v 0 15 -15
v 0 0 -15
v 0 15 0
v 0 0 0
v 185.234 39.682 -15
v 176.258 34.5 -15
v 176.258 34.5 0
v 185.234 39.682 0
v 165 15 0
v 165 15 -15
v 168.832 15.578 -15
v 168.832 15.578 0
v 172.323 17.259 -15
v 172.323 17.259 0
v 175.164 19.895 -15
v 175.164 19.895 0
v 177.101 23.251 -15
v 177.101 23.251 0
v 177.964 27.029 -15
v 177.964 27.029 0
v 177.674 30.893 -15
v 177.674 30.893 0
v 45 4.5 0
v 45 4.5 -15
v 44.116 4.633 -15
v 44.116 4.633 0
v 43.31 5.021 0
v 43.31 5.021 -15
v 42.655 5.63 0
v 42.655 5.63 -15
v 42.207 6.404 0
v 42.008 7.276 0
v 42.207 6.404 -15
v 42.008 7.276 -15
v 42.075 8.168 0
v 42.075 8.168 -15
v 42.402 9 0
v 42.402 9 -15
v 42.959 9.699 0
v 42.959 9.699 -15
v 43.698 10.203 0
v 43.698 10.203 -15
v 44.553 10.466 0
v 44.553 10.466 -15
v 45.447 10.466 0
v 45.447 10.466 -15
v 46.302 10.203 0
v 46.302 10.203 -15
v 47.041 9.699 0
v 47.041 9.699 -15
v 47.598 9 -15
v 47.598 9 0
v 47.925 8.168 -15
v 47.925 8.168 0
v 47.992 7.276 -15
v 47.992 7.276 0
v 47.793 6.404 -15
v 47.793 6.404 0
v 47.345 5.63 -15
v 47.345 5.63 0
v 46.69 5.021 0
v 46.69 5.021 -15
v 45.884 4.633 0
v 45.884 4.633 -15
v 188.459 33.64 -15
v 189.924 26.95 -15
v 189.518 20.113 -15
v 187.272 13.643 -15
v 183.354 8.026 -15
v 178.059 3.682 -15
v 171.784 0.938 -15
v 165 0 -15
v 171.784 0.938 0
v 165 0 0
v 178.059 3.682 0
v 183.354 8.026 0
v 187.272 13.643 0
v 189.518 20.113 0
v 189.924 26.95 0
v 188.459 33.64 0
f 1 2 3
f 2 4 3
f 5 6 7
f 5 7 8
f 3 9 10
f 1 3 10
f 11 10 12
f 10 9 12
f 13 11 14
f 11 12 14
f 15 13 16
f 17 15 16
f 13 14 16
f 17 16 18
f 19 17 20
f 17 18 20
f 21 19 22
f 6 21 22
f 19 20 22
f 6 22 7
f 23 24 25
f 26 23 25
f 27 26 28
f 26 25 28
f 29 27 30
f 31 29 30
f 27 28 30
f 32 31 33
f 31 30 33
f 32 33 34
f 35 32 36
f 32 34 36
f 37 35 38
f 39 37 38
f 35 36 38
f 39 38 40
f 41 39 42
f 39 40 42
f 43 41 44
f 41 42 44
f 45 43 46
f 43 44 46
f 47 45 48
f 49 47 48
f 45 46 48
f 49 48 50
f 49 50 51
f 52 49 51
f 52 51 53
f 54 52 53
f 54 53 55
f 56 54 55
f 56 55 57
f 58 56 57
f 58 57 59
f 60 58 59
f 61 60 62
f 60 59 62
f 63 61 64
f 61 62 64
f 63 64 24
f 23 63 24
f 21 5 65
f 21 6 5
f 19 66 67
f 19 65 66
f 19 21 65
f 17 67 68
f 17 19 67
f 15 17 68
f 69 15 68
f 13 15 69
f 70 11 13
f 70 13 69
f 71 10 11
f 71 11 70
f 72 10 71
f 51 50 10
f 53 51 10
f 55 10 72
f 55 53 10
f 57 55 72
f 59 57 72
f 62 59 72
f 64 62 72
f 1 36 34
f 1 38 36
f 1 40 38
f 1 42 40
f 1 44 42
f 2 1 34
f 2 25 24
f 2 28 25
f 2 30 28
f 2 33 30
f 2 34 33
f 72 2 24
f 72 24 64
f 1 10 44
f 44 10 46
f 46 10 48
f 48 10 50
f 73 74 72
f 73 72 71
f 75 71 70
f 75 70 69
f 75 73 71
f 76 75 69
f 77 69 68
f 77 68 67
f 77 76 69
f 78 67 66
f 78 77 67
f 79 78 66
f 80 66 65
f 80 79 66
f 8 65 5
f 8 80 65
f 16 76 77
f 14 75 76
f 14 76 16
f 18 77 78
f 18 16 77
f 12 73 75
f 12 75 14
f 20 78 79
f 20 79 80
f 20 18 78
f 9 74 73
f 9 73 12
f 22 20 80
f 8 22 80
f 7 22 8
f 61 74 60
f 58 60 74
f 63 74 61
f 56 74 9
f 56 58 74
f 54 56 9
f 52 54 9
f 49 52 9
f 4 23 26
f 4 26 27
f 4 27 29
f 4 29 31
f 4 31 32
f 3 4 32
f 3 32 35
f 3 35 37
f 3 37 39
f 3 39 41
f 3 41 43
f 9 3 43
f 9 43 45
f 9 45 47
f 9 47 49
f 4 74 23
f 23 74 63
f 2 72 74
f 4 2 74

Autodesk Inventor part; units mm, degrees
ref_plane "YZ Plane" through (0, 0, 0) normal (1, 0, 0) x (0, 1, 0)
ref_plane "XZ Plane" through (0, 0, 0) normal (0, 1, 0) x (-1, 0, 0)
ref_plane "XY Plane" through (0, 0, 0) normal (0, 0, 1) x (1, 0, 0)
sketch "Sketch1" plane through (0, 0, 0) normal (1, 0, 0) x (0, 1, 0)
  line L0 (0, 0) -> (15, 0)
  line L1 (15, 0) -> (15, -15)
  line L2 (15, -15) -> (0, -15)
  line L3 (0, -15) -> (0, 0)
  dimension "d1" = 15
  dimension "d2" = 15
extrude "Extrusion1" add sketch "Sketch1" along normal blind 165
sketch "Sketch2" plane through (0, 0, 0) normal (0, 0, 1) x (1, 0, 0)
  line L0 (104.748, 28) -> (222.799, 28) construction
  line L1 (0, 15) -> (165, 15) projected
  line L2 (165, 15) -> (165, 0) projected
  line L3 (165, 15) -> (165, 53.4623) construction
  line L4 (116.7358, 25) -> (195.5126, 25) construction
  line L5 (0, 0) -> (165, 0) projected
  line L6 (176.2583, 34.5) -> (185.2344, 39.6823)
  arc A0 (165, 0) -> (185.2344, 39.6823) centre (165, 25) ccw
  arc A1 (165, 15) -> (176.2583, 34.5) centre (165, 28) ccw
  dimension "d5" = 13
  dimension "d6" = 25
  dimension "d9" = 11.2583
  dimension "d10" = 20.2344
extrude "Extrusion2" add sketch "Sketch2" against normal blind 15
sketch "Sketch3" plane through (0, 0, 0) normal (0, 0, 1) x (1, 0, 0)
  line L0 (0, 0) -> (165, 0) projected
  point P0 (45, 7.5)
hole "Hole1" at (45, 7.5, 0) direction (0, 0, -1) diameter 6 end through all
properties part number "garra"
